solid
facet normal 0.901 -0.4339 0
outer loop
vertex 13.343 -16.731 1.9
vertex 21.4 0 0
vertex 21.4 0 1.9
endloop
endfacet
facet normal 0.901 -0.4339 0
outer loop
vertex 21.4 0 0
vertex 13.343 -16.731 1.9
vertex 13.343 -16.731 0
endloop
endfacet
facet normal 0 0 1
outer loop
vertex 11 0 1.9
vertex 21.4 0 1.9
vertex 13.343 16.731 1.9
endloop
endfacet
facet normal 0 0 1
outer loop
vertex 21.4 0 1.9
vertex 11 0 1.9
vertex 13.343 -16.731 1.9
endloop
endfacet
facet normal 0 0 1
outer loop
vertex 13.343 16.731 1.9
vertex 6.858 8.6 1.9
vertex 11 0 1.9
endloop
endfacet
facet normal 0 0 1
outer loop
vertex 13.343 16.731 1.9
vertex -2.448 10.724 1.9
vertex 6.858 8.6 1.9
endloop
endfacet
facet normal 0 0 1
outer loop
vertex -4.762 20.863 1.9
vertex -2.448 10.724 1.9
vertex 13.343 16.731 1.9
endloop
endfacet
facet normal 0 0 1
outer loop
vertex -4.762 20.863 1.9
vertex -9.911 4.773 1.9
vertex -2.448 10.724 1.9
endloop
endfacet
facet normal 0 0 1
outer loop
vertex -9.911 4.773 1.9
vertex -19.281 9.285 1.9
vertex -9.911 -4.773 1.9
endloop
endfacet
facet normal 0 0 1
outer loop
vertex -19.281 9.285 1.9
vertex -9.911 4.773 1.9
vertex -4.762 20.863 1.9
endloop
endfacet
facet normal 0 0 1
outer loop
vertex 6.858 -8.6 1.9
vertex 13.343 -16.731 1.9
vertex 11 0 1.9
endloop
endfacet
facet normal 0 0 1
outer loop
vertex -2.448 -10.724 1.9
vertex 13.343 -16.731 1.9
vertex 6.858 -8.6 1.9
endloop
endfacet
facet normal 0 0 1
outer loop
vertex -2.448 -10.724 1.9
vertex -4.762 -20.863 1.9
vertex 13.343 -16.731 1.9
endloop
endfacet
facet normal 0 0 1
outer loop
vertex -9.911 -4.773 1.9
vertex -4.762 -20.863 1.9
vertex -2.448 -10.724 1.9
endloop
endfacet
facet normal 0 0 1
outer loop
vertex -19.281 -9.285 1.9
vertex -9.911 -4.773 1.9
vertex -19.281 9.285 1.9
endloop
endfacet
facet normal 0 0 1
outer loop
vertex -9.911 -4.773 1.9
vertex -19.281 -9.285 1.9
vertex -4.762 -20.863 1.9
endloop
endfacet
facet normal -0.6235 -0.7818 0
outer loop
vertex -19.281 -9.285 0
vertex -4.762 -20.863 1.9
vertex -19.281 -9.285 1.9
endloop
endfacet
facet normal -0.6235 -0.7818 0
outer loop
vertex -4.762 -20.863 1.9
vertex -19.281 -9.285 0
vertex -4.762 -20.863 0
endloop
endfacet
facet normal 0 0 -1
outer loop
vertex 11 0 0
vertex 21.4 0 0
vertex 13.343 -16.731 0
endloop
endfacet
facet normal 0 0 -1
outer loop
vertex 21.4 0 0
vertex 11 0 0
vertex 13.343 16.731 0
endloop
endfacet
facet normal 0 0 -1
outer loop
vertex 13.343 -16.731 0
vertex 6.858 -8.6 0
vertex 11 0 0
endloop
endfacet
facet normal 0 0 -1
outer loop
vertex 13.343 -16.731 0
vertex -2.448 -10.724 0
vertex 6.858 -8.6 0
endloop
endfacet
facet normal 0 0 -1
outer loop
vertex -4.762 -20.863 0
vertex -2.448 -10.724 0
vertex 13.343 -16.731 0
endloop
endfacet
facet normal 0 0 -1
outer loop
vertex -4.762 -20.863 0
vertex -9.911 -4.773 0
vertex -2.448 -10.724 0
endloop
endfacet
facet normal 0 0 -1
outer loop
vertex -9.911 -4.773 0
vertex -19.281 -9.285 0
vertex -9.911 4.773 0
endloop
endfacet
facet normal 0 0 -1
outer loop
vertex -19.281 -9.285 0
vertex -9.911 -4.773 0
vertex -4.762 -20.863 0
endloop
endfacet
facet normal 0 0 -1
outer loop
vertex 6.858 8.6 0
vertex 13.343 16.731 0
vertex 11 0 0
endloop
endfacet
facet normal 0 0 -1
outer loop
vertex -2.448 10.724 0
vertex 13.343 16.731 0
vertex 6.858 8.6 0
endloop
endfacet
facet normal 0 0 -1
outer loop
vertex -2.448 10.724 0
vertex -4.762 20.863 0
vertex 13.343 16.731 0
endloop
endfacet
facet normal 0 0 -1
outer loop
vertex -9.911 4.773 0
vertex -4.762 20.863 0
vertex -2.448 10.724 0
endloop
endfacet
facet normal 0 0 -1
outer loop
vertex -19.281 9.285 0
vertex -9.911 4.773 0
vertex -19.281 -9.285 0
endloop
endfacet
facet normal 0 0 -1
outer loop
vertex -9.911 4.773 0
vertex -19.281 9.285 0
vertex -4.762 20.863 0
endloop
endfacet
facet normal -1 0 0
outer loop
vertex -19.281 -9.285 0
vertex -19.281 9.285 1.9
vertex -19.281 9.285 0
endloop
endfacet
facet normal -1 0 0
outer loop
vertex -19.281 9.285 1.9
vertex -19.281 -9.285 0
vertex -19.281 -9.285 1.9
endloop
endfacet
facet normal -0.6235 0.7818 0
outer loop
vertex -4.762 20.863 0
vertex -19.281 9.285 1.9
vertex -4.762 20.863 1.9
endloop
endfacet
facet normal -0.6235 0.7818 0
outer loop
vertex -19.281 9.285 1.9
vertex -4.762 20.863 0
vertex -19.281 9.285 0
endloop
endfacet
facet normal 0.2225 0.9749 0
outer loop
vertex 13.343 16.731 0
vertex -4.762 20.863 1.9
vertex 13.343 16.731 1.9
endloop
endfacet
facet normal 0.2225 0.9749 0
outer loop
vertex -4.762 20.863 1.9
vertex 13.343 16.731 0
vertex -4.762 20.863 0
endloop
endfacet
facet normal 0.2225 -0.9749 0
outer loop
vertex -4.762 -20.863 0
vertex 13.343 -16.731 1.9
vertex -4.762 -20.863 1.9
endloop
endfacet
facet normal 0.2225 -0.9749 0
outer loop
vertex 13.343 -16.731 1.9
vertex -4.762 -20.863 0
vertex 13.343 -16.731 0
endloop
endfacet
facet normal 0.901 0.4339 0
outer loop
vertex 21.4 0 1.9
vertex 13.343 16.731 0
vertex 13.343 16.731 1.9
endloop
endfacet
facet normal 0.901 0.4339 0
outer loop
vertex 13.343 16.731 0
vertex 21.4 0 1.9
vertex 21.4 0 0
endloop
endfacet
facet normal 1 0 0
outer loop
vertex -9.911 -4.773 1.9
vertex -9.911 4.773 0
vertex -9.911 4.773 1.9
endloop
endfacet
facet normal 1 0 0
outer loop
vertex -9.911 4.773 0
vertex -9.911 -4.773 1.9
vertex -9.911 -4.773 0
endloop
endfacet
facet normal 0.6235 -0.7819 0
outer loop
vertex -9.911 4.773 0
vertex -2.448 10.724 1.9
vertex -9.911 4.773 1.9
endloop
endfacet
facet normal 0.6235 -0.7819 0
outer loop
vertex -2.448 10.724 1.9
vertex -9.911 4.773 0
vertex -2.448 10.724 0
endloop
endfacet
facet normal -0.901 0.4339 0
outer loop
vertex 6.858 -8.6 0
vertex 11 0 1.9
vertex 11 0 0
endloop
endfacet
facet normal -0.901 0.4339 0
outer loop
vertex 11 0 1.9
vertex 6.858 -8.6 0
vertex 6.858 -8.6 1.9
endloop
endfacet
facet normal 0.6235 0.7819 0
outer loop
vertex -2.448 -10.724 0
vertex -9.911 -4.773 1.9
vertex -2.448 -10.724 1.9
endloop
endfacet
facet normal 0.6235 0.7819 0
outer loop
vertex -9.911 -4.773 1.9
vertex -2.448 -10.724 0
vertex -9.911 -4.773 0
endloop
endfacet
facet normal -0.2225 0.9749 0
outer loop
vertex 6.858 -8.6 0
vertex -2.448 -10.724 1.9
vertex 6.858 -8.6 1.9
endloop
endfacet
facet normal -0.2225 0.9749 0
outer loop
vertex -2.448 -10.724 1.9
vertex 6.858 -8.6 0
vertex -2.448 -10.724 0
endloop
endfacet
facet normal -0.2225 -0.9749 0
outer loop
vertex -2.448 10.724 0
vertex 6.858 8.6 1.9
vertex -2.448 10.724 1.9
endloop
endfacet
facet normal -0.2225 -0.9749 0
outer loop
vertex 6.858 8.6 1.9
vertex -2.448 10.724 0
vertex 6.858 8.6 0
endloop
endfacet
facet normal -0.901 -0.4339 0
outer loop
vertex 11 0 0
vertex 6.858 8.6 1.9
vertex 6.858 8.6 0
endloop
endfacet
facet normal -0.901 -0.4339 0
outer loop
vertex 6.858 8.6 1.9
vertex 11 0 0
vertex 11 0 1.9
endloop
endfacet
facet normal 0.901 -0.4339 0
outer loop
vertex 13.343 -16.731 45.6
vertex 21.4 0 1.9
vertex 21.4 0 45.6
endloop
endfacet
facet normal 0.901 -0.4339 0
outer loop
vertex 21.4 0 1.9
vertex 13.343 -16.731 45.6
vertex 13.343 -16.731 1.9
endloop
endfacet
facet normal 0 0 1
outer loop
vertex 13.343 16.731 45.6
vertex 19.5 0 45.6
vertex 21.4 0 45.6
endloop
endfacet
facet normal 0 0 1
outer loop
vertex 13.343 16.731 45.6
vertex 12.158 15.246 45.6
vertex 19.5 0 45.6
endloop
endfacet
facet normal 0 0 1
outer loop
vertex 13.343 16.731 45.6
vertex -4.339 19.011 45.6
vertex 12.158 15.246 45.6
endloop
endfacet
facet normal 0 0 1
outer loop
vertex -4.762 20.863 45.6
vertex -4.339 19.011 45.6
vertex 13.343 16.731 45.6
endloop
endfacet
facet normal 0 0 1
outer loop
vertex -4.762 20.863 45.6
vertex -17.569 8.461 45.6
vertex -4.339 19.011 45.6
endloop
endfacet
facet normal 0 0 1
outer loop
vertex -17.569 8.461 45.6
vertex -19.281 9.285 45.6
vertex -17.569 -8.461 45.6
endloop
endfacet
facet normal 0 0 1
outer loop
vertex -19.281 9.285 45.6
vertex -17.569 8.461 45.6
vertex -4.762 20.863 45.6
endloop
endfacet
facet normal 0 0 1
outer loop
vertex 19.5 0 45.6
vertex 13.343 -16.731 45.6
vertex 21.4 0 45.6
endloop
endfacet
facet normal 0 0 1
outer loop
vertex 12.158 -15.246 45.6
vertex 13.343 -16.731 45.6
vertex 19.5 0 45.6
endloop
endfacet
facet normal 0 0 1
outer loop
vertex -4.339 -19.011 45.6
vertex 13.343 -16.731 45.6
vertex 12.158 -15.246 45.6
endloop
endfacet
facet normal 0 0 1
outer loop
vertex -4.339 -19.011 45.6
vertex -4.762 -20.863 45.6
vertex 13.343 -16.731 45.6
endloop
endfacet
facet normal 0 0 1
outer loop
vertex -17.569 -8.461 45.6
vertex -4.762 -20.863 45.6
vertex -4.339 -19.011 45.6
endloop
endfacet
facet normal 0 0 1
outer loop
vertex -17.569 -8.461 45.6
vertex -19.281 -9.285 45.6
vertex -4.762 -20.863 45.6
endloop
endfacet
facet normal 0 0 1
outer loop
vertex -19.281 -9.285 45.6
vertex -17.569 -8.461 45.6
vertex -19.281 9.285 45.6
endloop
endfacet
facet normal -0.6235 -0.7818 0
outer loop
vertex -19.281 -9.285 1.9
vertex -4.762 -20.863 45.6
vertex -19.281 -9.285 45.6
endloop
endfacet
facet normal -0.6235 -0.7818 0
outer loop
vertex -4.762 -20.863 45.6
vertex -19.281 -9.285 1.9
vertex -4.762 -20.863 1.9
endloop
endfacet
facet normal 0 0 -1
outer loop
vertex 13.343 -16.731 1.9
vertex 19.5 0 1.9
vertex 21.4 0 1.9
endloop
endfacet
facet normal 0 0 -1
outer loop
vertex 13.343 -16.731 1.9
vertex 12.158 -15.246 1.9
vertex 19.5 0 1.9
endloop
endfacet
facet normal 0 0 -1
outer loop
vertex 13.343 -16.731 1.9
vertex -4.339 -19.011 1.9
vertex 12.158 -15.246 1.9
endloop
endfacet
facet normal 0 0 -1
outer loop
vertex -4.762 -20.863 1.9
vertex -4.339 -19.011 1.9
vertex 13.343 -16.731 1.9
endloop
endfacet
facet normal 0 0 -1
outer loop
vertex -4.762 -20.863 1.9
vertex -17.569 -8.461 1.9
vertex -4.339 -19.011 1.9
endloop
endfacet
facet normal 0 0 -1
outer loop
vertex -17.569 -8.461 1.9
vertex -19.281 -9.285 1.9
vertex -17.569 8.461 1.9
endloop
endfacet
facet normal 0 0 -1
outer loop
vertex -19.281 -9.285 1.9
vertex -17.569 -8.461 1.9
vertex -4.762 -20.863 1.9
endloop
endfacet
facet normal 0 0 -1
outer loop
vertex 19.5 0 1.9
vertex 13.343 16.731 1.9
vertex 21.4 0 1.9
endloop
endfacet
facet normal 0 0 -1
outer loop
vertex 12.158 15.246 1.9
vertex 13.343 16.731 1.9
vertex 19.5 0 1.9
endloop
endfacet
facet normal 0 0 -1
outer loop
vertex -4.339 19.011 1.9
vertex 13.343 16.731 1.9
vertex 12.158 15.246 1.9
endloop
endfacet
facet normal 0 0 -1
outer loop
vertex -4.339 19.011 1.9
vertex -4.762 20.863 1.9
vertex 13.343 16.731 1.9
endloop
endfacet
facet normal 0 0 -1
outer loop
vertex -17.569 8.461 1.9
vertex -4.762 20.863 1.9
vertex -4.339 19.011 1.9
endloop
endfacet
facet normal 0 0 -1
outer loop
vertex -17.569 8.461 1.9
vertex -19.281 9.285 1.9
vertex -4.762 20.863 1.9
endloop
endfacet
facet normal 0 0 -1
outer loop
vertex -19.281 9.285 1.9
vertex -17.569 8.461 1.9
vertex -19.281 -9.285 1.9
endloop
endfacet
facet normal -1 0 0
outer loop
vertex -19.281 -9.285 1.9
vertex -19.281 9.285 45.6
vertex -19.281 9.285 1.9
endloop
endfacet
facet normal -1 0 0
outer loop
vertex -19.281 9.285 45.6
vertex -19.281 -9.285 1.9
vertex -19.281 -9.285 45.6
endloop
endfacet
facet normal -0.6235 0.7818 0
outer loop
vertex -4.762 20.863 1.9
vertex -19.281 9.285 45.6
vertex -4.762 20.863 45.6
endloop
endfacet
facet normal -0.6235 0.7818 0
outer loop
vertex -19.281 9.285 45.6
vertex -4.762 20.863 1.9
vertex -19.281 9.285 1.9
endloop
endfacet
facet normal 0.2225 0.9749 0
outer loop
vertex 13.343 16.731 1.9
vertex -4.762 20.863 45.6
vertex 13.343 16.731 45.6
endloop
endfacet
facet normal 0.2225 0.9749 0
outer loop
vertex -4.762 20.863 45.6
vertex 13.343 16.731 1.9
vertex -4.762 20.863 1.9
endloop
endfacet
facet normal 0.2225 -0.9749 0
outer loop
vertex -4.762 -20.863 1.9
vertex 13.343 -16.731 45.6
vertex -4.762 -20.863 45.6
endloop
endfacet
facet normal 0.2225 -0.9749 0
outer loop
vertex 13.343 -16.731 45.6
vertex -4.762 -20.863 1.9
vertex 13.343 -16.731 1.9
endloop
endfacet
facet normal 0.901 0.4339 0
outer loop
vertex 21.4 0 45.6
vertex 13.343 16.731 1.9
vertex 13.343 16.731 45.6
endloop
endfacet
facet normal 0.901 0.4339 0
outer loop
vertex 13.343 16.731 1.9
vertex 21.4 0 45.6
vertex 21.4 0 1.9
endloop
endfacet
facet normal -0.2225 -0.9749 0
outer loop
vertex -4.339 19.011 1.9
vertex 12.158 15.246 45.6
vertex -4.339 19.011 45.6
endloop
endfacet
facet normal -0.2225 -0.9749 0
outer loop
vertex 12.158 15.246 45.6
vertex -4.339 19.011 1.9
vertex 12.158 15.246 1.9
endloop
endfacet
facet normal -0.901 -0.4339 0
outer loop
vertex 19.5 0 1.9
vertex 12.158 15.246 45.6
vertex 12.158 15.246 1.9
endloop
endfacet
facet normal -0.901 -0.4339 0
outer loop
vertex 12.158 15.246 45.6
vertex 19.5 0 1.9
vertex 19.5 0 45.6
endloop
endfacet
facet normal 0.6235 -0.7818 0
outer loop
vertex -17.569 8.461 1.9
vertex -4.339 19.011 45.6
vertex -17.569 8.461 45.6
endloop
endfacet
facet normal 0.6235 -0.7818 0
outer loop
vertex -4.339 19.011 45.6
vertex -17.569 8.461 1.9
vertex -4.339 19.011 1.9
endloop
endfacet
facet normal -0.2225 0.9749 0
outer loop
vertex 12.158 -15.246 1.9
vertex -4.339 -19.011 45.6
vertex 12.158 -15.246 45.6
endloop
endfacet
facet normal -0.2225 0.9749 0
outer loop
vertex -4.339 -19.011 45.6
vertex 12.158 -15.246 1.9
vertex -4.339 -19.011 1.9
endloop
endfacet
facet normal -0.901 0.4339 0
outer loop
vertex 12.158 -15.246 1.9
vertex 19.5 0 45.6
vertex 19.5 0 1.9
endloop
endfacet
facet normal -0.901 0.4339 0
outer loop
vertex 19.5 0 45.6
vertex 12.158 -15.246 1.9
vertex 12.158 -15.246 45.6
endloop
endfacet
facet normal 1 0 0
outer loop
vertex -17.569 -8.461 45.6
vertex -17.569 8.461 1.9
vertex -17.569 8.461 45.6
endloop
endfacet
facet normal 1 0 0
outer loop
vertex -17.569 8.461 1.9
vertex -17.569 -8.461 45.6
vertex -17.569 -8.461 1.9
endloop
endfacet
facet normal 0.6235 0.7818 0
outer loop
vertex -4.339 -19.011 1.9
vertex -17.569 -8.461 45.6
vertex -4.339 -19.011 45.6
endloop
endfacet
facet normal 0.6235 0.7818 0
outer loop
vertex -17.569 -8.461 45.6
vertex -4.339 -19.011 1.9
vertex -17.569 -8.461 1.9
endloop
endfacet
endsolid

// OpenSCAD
// file: measurements.scad
thickness = 1.9;
finger_d = 22;

module holder(h) {
    // Child 0 is the outer shape
    // Child 1 is the inner shape
    // Child 2 is the end-cap hole shape
    // Bottom end
    difference() {
        linear_extrude(thickness) { children(0); }
        translate([0, 0, -1])
            linear_extrude(thickness+2) { children(2); }
    }
    // Main chamber: h + thickness to leave room for the lid.
    translate([0, 0, thickness])
        difference() {
            linear_extrude(h + thickness) { children(0); }
            translate([0, 0, -1])
                linear_extrude(h + thickness + 2) { children(1); }
        }
}

module lid() {
    // Child 0 is the outer shape
    // Child 1 is the inner shape
    // Child 2 is the end-cap hole shape
    // Bottom end
    difference() {
        linear_extrude(thickness) { children(0); }
        translate([0, 0, -1])
            linear_extrude(thickness+2) { children(2); }
    }
    // Cap plug
    translate([0, 0, thickness])
        difference() {
            linear_extrude(thickness) { children(1); }
            translate([0, 0, -1])
                linear_extrude(thickness+2) { children(2); }
        }
}

//
// Discovery Tiles
//

discovery_w = 24;
discovery_count = 21;

function discovery_corner_r(w) = w * 7 / 24;

module discovery_tile_shape(w) {
    r = discovery_corner_r(w);
    translate([-w/2, -w/2]) {
        translate([w-r, w-r])
            circle(r=r, $fn=64);
        square([w-r, w]);
        square([w, w-r]);
    }
}

//
// Ancients
//

ancient_r = 19.5;
ancient_count = 22;

//
// Monotliths/Orbitals
//

monolith_orbital_d = 25.25;
monolith_orbital_count = 22;
// main file
include <measurements.scad>

holder(thickness*ancient_count) {
    circle(r=ancient_r+thickness, $fn=7);
    circle(r=ancient_r, $fn=7);
    circle(r=finger_d/2, $fn=7);
}
